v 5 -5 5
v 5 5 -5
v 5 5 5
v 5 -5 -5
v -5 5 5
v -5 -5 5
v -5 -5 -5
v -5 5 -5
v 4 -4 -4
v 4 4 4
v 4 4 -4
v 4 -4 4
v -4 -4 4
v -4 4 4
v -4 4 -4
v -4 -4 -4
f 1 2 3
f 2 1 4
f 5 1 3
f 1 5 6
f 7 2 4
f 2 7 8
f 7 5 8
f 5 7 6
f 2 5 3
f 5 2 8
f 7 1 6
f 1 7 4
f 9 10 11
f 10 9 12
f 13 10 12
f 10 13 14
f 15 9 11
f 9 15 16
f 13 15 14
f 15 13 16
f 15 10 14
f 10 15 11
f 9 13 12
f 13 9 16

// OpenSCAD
difference() {
  cube(size=10.0,center=true);
  cube(size=8.0,center=true);
}
